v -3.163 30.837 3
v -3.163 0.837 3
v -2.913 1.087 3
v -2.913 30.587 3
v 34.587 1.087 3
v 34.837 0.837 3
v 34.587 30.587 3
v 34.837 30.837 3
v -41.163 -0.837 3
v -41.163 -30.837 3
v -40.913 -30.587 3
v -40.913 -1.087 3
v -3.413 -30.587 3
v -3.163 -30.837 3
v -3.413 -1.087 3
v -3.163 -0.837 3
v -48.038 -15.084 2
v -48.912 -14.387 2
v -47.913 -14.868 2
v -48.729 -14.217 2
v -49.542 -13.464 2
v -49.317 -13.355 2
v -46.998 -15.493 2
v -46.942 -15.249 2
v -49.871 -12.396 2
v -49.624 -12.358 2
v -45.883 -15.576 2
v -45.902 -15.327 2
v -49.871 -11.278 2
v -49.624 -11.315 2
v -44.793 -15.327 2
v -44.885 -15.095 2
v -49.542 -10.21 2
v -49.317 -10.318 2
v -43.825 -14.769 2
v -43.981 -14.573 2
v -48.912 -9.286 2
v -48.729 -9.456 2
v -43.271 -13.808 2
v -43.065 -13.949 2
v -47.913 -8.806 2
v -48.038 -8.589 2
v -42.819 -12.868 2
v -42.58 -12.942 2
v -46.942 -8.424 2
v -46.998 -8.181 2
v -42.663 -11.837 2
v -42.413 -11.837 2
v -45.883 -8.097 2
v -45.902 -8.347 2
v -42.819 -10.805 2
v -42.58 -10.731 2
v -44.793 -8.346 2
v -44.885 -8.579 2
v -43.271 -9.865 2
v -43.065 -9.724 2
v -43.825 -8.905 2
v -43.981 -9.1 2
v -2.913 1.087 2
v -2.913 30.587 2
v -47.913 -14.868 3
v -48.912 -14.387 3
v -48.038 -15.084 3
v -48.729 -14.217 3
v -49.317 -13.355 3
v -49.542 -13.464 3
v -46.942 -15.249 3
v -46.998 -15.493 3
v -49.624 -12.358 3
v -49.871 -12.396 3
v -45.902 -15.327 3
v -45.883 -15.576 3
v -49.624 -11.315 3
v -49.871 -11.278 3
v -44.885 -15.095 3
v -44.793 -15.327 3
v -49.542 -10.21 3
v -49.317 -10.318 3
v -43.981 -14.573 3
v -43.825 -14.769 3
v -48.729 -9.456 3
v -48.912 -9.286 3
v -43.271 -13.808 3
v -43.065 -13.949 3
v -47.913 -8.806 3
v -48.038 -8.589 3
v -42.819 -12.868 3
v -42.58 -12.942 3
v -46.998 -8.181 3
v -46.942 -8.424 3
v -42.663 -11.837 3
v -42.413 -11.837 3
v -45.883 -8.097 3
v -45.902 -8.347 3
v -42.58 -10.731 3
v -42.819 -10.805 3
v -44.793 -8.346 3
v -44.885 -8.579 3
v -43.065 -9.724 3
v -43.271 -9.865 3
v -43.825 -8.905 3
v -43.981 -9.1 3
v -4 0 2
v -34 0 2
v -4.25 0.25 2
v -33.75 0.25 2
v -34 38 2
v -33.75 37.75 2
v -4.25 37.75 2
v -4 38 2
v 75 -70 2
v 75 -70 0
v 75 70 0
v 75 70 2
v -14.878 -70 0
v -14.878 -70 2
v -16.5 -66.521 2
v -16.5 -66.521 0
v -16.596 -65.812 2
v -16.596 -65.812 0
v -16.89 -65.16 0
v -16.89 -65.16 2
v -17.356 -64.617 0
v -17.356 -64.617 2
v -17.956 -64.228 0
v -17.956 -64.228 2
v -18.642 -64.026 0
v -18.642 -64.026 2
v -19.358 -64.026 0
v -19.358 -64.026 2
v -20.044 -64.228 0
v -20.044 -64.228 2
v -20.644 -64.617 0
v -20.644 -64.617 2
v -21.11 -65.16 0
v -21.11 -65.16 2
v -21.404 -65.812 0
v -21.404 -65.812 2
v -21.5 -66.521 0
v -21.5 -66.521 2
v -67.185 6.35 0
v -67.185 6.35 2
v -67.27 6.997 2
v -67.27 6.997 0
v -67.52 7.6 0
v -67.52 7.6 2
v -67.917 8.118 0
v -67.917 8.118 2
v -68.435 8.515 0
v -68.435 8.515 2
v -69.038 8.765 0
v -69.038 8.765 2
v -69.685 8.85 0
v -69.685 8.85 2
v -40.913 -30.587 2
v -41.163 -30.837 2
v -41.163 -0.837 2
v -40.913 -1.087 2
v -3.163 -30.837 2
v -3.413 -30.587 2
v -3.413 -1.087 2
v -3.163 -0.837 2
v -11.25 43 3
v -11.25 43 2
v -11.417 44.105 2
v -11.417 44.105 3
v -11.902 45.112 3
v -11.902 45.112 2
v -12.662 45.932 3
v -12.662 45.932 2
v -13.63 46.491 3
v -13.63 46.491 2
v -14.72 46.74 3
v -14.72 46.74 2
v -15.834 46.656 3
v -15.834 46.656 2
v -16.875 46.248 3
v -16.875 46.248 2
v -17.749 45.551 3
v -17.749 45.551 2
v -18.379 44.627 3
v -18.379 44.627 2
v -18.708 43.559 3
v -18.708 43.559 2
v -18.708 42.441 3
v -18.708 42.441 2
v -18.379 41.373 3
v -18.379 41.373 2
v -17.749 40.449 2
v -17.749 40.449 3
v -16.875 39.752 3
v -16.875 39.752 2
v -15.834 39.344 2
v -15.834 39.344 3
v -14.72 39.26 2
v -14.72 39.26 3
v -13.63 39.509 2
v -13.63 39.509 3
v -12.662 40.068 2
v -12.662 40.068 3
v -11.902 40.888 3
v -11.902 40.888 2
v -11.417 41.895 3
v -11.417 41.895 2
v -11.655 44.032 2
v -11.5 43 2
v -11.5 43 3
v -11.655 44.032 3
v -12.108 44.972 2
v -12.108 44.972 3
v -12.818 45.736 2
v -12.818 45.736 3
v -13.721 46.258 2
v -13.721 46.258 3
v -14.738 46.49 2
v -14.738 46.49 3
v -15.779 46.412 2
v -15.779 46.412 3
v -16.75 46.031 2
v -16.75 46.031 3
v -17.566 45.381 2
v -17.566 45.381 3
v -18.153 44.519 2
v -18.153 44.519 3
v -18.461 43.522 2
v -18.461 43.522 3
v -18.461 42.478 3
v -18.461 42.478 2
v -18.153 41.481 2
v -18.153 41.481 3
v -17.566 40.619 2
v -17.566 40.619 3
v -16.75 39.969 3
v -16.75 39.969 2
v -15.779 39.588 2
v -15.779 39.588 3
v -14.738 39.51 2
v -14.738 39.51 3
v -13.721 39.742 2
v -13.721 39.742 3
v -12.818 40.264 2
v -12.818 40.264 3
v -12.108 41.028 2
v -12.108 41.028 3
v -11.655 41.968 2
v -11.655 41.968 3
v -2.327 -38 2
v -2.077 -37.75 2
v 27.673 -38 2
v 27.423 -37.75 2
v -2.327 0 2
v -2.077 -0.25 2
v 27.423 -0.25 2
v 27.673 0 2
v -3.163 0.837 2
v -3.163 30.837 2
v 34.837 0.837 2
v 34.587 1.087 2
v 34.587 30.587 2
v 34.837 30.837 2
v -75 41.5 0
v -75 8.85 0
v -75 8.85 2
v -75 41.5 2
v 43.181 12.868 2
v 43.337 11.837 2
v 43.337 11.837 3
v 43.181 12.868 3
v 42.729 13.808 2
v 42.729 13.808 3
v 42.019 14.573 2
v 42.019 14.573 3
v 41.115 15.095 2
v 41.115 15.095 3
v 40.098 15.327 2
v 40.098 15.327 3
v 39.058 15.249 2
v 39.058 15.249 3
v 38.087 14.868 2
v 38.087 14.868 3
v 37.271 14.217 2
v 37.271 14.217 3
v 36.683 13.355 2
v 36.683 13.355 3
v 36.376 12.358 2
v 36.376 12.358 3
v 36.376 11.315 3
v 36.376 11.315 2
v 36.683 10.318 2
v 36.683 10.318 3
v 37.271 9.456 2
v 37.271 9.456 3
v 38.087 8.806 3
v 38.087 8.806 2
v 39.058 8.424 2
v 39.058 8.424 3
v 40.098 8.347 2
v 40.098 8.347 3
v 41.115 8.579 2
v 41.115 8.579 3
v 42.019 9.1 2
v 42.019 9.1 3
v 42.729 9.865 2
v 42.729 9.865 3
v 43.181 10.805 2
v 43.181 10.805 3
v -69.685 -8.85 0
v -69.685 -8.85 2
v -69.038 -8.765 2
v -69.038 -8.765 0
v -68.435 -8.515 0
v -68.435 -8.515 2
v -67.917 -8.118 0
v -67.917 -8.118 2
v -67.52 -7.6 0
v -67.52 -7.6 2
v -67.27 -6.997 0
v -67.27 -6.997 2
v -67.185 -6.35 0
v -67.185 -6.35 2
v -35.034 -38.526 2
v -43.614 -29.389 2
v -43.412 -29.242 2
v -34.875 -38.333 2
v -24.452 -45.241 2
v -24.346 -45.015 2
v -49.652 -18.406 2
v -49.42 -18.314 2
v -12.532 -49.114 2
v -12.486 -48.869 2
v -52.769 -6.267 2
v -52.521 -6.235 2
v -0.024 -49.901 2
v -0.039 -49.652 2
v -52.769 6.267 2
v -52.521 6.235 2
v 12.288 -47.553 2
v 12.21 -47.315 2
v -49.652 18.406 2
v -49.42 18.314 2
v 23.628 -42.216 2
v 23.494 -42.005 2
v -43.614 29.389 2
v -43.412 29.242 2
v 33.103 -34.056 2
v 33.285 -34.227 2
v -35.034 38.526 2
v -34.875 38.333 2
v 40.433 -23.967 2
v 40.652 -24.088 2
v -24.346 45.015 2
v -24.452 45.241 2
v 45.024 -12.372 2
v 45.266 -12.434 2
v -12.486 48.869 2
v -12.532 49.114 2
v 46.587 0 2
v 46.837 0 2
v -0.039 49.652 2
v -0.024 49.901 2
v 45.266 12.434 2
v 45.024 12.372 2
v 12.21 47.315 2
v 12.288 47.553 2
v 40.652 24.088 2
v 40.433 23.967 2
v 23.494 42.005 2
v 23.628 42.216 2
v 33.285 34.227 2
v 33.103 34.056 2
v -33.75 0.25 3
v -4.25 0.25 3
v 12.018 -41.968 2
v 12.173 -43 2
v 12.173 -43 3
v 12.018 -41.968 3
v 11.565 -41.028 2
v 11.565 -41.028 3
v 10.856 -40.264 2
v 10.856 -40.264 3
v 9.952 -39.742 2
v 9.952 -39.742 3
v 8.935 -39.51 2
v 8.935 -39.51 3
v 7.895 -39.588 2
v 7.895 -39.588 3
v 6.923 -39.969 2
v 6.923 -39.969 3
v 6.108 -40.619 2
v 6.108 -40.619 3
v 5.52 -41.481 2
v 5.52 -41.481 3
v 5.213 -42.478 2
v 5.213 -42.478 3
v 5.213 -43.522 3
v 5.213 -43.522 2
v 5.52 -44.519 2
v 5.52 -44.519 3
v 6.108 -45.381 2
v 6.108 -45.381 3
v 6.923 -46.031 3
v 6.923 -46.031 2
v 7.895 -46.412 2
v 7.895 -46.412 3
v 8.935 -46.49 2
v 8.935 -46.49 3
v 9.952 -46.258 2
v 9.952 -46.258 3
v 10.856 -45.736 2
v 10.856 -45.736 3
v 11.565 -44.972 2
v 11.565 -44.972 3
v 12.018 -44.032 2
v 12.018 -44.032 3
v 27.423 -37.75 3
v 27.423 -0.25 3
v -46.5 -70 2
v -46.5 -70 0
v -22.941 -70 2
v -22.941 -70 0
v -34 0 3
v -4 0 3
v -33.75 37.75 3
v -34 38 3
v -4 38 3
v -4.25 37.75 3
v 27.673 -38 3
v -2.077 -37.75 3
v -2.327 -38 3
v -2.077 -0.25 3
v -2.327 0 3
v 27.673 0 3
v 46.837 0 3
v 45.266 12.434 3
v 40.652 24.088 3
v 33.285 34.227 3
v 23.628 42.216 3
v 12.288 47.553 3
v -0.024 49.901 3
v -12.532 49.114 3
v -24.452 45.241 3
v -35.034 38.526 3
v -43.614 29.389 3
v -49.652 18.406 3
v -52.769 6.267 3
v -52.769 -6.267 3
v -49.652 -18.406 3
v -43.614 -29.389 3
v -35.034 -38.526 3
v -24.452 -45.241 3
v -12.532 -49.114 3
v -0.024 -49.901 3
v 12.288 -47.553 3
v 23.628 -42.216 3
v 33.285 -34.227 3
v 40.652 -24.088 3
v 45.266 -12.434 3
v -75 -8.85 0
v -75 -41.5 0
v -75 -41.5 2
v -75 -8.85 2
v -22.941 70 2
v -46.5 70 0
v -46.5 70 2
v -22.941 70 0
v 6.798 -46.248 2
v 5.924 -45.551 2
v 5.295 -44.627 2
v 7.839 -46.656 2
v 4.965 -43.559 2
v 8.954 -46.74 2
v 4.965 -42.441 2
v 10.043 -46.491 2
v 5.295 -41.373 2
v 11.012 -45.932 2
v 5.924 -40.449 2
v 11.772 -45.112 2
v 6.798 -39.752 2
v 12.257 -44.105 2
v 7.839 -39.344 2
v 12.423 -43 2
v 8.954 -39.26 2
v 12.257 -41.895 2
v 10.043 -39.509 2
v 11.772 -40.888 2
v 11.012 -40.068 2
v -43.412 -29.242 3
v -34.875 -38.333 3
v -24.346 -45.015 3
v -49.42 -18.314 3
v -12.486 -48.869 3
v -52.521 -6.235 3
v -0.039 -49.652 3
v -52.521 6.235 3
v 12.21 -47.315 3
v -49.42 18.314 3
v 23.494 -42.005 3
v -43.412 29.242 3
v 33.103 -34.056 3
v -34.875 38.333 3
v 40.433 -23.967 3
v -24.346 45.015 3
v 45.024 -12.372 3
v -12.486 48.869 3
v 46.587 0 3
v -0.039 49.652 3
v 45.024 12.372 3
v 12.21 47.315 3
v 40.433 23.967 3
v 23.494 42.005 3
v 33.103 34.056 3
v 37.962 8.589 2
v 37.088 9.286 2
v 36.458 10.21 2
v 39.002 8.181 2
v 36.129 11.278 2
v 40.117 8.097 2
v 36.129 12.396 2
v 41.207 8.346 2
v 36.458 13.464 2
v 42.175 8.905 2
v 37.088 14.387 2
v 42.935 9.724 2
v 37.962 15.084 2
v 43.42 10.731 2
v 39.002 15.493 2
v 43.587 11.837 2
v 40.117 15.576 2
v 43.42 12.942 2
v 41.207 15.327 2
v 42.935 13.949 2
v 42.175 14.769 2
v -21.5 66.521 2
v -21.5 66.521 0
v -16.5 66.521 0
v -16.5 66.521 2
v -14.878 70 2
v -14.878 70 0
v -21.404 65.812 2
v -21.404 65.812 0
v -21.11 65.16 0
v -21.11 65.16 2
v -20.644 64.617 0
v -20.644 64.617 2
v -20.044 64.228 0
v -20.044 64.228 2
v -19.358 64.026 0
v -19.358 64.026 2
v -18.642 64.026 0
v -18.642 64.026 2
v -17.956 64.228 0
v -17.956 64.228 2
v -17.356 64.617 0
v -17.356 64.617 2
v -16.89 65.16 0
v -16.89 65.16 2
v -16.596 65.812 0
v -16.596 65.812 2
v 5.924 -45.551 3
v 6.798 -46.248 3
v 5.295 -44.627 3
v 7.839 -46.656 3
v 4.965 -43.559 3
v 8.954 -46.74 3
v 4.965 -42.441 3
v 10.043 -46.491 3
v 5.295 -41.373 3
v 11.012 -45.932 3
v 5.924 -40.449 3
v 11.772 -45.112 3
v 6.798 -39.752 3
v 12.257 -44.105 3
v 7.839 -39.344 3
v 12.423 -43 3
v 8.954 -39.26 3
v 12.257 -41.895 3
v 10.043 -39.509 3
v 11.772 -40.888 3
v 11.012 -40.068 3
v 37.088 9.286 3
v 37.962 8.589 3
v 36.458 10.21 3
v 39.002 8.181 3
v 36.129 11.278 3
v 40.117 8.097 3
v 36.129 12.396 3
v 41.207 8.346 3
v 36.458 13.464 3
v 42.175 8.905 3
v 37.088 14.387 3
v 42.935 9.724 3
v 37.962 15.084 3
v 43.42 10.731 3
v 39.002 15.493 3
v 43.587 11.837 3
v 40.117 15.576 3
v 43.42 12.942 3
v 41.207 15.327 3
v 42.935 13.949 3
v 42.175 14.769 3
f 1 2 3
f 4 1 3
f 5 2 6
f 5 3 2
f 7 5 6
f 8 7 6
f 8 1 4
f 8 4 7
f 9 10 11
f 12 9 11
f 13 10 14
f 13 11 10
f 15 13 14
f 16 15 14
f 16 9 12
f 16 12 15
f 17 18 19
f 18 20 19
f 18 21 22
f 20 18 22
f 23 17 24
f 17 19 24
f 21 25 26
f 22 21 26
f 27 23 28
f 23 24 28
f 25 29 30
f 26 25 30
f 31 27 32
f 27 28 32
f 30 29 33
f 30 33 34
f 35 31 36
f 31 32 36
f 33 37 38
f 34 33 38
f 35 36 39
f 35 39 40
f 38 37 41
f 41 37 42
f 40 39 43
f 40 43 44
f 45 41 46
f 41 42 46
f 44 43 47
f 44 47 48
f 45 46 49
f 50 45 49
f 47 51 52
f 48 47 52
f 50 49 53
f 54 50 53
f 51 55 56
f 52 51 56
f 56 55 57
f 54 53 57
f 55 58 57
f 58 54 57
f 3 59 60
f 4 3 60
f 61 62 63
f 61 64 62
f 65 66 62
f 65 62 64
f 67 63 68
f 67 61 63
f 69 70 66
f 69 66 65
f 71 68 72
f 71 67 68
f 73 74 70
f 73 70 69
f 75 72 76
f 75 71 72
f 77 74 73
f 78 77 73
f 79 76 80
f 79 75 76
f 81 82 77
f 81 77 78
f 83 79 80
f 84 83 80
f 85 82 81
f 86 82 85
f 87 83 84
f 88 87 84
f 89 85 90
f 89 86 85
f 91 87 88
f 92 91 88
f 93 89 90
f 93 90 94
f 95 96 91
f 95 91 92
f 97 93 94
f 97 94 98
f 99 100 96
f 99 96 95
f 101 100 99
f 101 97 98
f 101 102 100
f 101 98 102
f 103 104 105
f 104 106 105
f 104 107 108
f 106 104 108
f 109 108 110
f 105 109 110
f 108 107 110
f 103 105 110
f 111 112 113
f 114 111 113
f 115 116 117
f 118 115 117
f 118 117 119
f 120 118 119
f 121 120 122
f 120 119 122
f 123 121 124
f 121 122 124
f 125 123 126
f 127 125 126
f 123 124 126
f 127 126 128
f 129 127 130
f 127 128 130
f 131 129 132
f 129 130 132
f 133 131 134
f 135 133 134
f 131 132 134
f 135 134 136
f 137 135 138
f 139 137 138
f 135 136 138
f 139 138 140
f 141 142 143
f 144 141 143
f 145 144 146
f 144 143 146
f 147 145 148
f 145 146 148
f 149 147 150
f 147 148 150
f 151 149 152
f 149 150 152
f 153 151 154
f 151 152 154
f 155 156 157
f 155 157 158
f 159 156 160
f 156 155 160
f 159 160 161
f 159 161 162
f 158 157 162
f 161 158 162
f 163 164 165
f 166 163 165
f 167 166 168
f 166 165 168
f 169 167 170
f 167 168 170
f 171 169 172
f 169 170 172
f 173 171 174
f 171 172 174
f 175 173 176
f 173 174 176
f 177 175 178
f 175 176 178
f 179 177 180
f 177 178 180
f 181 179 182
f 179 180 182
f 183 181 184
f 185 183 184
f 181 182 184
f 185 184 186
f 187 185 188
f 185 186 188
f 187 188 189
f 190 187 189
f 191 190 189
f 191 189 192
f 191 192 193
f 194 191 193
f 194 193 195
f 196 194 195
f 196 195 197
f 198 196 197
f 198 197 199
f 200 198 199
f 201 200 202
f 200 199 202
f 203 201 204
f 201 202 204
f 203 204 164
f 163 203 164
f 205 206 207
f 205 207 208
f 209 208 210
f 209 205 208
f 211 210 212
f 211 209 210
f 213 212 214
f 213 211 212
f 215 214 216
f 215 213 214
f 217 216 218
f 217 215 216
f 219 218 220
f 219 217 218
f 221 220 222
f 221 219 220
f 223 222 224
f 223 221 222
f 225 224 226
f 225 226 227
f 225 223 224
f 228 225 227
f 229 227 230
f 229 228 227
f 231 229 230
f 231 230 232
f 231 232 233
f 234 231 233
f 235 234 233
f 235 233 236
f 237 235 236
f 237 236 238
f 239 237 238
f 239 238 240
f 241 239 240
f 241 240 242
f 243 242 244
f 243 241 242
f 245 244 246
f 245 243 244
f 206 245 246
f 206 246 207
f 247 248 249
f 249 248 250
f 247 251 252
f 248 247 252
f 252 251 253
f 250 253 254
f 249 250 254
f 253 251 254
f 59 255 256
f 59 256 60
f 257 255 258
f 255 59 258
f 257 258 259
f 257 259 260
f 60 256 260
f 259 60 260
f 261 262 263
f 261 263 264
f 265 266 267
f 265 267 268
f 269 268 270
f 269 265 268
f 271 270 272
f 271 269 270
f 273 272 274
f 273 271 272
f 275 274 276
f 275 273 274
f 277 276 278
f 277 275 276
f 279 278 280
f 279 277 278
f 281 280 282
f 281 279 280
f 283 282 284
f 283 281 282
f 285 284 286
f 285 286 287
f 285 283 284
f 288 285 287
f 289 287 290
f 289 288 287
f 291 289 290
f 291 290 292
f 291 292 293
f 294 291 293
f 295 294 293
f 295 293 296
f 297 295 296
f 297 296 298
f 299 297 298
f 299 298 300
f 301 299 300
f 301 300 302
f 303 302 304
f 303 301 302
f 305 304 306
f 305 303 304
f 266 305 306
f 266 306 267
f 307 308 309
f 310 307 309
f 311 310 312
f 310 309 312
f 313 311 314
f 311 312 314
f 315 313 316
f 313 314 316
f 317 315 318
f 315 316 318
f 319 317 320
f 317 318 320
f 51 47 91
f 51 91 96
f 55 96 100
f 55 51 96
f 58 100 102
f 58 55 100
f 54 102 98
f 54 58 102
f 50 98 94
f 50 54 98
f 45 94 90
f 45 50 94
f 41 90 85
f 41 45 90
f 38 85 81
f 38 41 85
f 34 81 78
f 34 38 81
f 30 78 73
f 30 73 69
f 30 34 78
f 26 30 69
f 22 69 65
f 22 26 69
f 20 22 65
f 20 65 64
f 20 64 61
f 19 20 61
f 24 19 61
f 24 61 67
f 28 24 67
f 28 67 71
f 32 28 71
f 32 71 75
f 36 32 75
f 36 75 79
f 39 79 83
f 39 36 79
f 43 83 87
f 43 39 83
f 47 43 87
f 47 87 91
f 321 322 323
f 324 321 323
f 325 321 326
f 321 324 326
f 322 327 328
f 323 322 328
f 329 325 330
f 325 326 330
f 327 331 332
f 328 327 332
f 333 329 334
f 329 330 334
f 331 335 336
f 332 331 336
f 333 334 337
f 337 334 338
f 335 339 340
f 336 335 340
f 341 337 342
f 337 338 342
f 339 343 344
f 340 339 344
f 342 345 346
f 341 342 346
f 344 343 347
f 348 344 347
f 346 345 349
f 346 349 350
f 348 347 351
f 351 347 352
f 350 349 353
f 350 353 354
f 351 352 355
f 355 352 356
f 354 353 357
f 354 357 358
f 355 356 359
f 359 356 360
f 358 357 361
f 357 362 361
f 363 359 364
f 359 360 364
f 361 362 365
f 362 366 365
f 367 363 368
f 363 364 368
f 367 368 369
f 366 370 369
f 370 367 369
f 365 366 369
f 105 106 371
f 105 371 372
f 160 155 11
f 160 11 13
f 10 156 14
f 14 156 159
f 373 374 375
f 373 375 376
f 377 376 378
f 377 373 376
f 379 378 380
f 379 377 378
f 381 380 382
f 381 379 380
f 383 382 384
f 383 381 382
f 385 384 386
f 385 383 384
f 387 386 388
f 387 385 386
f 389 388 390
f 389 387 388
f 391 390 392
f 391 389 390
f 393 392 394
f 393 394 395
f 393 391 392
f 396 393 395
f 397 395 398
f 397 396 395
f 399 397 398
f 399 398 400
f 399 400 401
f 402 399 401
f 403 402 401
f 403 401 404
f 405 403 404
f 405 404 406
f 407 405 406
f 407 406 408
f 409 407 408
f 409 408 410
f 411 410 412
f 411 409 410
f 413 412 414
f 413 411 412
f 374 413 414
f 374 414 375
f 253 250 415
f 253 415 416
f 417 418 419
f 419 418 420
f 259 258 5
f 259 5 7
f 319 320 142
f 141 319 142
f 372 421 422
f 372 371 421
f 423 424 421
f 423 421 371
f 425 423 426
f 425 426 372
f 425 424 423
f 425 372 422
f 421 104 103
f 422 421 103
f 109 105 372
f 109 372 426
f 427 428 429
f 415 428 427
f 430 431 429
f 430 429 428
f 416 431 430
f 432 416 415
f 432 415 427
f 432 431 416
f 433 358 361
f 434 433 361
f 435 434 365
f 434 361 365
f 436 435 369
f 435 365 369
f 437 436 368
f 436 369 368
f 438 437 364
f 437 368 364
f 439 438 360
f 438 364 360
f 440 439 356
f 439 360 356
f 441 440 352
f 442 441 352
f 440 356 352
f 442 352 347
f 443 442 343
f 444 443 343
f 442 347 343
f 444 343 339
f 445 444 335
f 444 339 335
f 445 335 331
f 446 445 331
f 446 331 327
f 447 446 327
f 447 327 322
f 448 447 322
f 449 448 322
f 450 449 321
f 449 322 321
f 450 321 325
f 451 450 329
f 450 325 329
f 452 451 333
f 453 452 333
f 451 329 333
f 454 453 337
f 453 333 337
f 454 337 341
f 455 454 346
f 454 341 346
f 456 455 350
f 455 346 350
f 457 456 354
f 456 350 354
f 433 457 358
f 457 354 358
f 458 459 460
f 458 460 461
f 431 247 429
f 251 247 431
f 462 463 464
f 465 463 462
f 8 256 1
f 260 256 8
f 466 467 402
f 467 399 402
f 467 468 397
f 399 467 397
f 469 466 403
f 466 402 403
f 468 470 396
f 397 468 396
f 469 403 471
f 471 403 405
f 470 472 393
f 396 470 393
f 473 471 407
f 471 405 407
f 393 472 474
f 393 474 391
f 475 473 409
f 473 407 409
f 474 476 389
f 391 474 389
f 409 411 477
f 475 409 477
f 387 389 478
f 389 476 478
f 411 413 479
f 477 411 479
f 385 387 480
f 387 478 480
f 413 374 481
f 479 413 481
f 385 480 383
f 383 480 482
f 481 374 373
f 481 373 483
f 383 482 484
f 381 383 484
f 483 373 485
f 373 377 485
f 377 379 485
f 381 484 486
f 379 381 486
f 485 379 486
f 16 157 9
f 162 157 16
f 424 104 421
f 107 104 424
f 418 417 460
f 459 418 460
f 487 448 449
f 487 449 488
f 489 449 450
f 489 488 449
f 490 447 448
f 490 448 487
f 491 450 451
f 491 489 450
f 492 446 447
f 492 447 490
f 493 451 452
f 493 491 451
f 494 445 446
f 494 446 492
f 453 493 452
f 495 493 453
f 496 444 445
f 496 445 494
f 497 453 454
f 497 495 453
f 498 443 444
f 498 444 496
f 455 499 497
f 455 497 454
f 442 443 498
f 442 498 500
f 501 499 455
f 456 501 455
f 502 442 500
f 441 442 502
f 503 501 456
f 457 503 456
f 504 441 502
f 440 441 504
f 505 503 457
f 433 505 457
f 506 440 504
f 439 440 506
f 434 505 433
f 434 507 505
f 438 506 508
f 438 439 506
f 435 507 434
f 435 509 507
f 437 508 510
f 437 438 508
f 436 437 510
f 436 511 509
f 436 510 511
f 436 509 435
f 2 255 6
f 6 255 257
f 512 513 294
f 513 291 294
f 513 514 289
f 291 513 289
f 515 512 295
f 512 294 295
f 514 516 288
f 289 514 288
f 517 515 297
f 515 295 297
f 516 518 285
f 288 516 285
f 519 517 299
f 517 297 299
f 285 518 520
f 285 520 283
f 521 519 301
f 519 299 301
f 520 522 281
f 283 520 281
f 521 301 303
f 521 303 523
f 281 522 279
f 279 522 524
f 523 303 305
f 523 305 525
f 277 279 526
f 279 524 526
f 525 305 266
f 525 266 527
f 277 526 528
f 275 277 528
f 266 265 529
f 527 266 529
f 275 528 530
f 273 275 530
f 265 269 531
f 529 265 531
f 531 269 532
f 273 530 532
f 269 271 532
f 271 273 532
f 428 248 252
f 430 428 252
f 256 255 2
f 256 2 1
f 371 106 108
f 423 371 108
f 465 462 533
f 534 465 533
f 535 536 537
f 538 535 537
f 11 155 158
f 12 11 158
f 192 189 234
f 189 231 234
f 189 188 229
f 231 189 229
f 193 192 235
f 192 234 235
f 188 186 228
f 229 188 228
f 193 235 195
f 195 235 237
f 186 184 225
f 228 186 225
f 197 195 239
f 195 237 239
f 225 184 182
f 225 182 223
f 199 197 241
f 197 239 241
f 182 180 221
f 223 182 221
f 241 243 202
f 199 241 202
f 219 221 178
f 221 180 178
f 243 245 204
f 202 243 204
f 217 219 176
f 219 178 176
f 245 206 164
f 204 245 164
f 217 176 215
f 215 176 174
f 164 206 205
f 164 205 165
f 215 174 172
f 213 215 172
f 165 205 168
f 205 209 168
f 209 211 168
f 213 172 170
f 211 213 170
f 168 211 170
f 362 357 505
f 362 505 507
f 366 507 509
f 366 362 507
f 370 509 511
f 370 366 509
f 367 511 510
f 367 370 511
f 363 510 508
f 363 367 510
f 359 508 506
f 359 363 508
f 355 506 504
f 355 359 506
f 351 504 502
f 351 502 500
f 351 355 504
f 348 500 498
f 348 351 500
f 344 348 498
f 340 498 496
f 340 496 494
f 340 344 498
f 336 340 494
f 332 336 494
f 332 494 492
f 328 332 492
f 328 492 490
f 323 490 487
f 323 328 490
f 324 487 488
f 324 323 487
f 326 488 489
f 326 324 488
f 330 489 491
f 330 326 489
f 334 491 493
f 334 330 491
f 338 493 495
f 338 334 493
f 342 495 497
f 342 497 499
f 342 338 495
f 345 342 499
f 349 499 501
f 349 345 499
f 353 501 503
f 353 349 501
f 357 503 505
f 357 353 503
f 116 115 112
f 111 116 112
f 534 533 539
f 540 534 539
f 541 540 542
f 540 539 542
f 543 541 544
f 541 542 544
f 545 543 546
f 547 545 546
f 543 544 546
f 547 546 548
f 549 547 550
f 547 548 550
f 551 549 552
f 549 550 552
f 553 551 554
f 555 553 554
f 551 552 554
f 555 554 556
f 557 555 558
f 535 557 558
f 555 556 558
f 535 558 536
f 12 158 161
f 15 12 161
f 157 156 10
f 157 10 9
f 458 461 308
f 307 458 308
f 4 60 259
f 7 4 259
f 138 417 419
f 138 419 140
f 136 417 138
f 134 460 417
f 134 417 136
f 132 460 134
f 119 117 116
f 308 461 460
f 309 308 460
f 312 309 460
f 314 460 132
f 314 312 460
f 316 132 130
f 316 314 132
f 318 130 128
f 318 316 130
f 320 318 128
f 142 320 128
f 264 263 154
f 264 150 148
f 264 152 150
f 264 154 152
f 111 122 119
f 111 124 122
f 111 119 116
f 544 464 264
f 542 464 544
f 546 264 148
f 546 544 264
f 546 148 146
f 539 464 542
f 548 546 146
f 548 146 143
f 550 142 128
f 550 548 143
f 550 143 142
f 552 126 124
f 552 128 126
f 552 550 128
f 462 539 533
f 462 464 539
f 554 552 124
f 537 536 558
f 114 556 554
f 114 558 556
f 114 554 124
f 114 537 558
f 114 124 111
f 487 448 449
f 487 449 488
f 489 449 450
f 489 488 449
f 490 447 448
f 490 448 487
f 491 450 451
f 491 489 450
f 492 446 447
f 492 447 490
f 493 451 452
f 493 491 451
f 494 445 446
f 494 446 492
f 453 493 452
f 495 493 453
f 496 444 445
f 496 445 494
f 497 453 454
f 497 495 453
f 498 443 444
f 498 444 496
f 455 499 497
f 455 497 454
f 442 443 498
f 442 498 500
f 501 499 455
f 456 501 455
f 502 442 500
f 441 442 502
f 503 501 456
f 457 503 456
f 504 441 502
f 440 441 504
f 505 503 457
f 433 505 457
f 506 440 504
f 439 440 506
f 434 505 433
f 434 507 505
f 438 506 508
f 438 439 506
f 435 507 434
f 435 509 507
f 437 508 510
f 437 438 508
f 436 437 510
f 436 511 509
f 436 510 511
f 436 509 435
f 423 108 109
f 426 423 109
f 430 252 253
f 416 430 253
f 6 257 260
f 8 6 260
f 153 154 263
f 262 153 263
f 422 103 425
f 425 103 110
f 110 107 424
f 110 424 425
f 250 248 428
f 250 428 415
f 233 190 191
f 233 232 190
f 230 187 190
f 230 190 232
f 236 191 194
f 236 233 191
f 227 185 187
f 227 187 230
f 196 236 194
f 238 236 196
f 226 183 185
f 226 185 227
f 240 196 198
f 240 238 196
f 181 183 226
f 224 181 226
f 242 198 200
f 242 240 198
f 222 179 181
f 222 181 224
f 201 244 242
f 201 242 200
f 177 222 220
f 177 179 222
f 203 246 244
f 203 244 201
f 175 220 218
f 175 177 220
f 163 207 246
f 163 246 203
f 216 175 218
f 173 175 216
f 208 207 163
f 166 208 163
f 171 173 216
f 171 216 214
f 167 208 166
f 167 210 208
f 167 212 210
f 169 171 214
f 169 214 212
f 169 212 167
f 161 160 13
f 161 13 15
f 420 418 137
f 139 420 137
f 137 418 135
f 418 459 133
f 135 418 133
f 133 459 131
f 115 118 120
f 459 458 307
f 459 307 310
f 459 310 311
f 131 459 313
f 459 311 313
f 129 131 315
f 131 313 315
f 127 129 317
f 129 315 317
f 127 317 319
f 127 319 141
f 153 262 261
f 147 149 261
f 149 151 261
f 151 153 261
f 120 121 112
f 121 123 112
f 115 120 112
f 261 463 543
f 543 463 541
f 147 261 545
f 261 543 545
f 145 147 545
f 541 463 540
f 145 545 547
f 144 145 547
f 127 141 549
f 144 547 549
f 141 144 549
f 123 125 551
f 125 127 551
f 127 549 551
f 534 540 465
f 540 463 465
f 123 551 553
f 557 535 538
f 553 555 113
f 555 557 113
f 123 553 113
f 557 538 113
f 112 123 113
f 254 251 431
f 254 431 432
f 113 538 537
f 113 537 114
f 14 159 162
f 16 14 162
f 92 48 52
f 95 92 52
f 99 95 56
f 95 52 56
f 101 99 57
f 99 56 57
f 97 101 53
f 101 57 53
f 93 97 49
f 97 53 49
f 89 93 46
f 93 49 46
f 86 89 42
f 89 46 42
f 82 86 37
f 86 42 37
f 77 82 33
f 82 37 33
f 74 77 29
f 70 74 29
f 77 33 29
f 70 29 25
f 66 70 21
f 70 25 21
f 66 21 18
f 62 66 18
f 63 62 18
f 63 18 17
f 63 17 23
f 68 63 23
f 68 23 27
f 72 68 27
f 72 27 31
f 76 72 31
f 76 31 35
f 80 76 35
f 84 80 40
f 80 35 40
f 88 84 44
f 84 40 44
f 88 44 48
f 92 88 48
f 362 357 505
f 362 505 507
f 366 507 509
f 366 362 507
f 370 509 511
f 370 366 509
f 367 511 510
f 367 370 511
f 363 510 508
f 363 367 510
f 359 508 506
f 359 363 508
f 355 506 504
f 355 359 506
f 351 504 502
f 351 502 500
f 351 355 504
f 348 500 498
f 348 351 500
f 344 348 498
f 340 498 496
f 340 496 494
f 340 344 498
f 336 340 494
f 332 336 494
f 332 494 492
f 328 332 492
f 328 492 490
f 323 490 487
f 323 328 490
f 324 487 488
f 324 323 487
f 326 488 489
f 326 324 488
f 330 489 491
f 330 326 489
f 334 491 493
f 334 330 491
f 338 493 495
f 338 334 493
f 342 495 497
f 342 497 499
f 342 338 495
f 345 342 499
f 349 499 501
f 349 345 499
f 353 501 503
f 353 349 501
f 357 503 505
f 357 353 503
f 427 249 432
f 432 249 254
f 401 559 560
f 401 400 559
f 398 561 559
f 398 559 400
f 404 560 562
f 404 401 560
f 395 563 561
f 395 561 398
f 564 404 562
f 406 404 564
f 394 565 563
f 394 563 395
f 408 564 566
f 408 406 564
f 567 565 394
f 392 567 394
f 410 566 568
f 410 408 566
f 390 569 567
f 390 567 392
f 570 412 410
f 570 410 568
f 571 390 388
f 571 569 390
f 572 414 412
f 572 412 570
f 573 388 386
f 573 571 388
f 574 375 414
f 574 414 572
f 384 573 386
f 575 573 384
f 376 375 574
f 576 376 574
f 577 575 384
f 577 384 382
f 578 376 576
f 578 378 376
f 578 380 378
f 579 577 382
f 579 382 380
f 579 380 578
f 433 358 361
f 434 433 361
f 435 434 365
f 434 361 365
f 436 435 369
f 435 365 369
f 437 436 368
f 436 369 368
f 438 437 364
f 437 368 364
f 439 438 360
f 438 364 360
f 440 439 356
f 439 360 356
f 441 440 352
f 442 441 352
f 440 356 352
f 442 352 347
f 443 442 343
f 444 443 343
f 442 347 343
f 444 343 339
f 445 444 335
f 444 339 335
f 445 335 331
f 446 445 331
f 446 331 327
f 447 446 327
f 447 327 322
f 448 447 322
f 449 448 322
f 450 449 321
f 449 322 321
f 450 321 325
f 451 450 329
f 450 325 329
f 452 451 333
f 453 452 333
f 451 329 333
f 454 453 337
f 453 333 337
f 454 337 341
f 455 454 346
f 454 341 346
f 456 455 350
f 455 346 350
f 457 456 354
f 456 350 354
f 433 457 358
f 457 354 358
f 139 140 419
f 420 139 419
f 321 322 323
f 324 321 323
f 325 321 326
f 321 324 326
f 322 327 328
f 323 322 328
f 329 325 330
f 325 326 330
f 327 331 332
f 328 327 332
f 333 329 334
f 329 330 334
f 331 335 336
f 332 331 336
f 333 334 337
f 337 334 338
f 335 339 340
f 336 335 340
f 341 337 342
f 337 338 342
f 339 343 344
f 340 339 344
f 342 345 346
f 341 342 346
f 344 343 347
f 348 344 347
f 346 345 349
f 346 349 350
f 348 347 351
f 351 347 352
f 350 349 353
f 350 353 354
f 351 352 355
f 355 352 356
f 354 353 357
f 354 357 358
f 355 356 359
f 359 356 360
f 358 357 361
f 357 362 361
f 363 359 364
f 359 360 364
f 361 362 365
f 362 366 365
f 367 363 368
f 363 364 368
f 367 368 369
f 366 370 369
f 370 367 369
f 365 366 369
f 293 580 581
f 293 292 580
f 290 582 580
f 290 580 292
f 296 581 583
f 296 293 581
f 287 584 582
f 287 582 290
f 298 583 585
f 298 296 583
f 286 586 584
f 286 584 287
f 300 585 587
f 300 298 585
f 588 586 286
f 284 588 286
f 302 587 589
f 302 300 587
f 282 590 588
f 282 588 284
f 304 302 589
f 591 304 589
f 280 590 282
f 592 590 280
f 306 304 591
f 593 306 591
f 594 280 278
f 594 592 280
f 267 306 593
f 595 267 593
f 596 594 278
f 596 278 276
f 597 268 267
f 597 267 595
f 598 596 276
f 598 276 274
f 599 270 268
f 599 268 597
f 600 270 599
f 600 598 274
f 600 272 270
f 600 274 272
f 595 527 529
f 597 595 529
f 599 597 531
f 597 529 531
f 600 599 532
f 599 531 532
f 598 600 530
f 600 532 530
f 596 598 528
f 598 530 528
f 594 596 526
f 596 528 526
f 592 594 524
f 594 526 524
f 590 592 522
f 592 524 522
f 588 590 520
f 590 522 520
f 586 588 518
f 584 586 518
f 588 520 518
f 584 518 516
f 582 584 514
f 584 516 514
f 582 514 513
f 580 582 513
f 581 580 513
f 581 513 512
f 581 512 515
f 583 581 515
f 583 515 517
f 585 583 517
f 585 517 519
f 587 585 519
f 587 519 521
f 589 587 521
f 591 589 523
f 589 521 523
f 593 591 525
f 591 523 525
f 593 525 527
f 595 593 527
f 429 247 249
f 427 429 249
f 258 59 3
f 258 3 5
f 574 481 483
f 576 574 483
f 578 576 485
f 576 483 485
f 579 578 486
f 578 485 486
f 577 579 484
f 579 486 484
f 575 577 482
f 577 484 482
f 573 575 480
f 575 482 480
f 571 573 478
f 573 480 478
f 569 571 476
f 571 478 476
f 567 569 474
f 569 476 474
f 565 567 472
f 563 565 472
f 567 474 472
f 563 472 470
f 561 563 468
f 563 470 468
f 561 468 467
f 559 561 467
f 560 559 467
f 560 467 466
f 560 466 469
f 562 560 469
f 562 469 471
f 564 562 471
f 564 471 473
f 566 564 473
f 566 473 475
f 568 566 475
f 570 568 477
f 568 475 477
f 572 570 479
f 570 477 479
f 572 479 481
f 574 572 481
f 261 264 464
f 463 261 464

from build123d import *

# Parameters (mm, degrees)
F0_W     = 150
F0_H     = 140
F1_DEPTH = 2
F2_R     = 2.5
F3_DEPTH = 5
F4_R     = 50
F4_R_2   = 49.75
F5_DEPTH = 1
F6_DEPTH = 1
F4_W     = 38
F4_H     = 30
F4_W_2   = 37.5
F4_H_2   = 29.5
F4_R_3   = 3.75
F4_R_4   = 3.5
F4_W_3   = 30
F4_H_3   = 38
F4_W_4   = 29.5
F4_H_4   = 37.5


# Not quite as in the source:
# - a feature names something its author has since deleted; it is built from what else it names


with BuildPart() as f1:
    # F0 (on Top) → F1 (new body)
    with BuildSketch(Plane.XY):
        Rectangle(F0_W, F0_H)
    extrude(amount=F1_DEPTH)

    # F2 (on face) → F3 (cut)
    with BuildSketch(Plane.XY.offset(2)):
        Polygon((-75, 70), (-75, 41.5), (-46.5, 70), align=None)
        with Locations((-64, 57.6)):
            Circle(F2_R, mode=Mode.SUBTRACT)
        Polygon((-46.5, -70), (-75, -41.5), (-75, -70), align=None)
        with Locations((-64, -57.6)):
            Circle(F2_R, mode=Mode.SUBTRACT)
        with BuildLine():
            Line((-67.1845650673, -6.35), (-67.1845650673, 6.35))
            ThreePointArc((-67.1845650673, 6.35), (-67.9167981143, 8.117766953), (-69.6845650673, 8.85))
            Line((-69.6845650673, 8.85), (-75, 8.85))
            Line((-75, 8.85), (-75, -8.85))
            Line((-75, -8.85), (-69.6845650673, -8.85))
            ThreePointArc((-69.6845650673, -8.85), (-67.9167981143, -8.117766953), (-67.1845650673, -6.35))
        make_face()
        with BuildLine():
            Line((-21.499911428, -66.5210440509), (-22.940942165, -70))
            Line((-22.940942165, -70), (-14.8778247705, -70))
            Line((-14.8778247705, -70), (-16.500088572, -66.5210440509))
            ThreePointArc((-16.500088572, -66.5210440509), (-19, -64), (-21.499911428, -66.5210440509))
        make_face()
        with BuildLine():
            Line((-14.8778247705, 70), (-22.940942165, 70))
            Line((-22.940942165, 70), (-21.499911428, 66.5210440509))
            ThreePointArc((-21.499911428, 66.5210440509), (-19, 64), (-16.500088572, 66.5210440509))
            Line((-16.500088572, 66.5210440509), (-14.8778247705, 70))
        make_face()
        with Locations((-64, 57.6)):
            Circle(F2_R)
        with Locations((-64, -57.6)):
            Circle(F2_R)
    extrude(amount=-F3_DEPTH, mode=Mode.SUBTRACT)


with BuildPart() as f5:
    # F4 (on face) → F5 (new body)
    with BuildSketch(Plane.XY.offset(2)):
        with Locations((-3.1632825379, 0)):
            Circle(F4_R)
        with Locations((-3.1632825379, 0)):
            Circle(F4_R_2, mode=Mode.SUBTRACT)
    extrude(amount=F5_DEPTH)


with BuildPart() as f6:
    # F4 (on face) → F6 (new body)
    with BuildSketch(Plane.XY.offset(2)):
        with Locations((-3.1632825379, 0)):
            Circle(F4_R)
        with Locations((-3.1632825379, 0)):
            Circle(F4_R_2, mode=Mode.SUBTRACT)
    extrude(amount=F6_DEPTH)


with BuildPart() as f6b:
    # F4 (on face) → F6, piece 2 (new body)
    with BuildSketch(Plane.XY.offset(2)):
        with Locations((-22.1632825379, -15.8367174621)):
            Rectangle(F4_W, F4_H)
        with Locations((-22.1632825379, -15.8367174621)):
            Rectangle(F4_W_2, F4_H_2, mode=Mode.SUBTRACT)
    extrude(amount=F6_DEPTH)


with BuildPart() as f6c:
    # F4 (on face) → F6, piece 3 (new body)
    with BuildSketch(Plane.XY.offset(2)):
        with Locations((-46.1632825379, -11.8367174621)):
            Circle(F4_R_3)
        with Locations((-46.1632825379, -11.8367174621)):
            Circle(F4_R_4, mode=Mode.SUBTRACT)
    extrude(amount=F6_DEPTH)


with BuildPart() as f6d:
    # F4 (on face) → F6, piece 4 (new body)
    with BuildSketch(Plane.XY.offset(2)):
        with Locations((-19, 19)):
            Rectangle(F4_W_3, F4_H_3)
        with Locations((-19, 19)):
            Rectangle(F4_W_4, F4_H_4, mode=Mode.SUBTRACT)
    extrude(amount=F6_DEPTH)


with BuildPart() as f6e:
    # F4 (on face) → F6, piece 5 (new body)
    with BuildSketch(Plane.XY.offset(2)):
        with Locations((15.8367174621, 15.8367174621)):
            Rectangle(F4_W, F4_H)
        with Locations((15.8367174621, 15.8367174621)):
            Rectangle(F4_W_2, F4_H_2, mode=Mode.SUBTRACT)
    extrude(amount=F6_DEPTH)


with BuildPart() as f6f:
    # F4 (on face) → F6, piece 6 (new body)
    with BuildSketch(Plane.XY.offset(2)):
        with Locations((12.6734349243, -19)):
            Rectangle(F4_W_3, F4_H_3)
        with Locations((12.6734349243, -19)):
            Rectangle(F4_W_4, F4_H_4, mode=Mode.SUBTRACT)
    extrude(amount=F6_DEPTH)


with BuildPart() as f6g:
    # F4 (on face) → F6, piece 7 (new body)
    with BuildSketch(Plane.XY.offset(2)):
        with Locations((39.8367174621, 11.8367174621)):
            Circle(F4_R_3)
        with Locations((39.8367174621, 11.8367174621)):
            Circle(F4_R_4, mode=Mode.SUBTRACT)
    extrude(amount=F6_DEPTH)


with BuildPart() as f6h:
    # F4 (on face) → F6, piece 8 (new body)
    with BuildSketch(Plane.XY.offset(2)):
        with Locations((8.6734349243, -43)):
            Circle(F4_R_3)
        with Locations((8.6734349243, -43)):
            Circle(F4_R_4, mode=Mode.SUBTRACT)
    extrude(amount=F6_DEPTH)


with BuildPart() as f6i:
    # F4 (on face) → F6, piece 9 (new body)
    with BuildSketch(Plane.XY.offset(2)):
        with Locations((-15, 43)):
            Circle(F4_R_3)
        with Locations((-15, 43)):
            Circle(F4_R_4, mode=Mode.SUBTRACT)
    extrude(amount=F6_DEPTH)


solid = Compound([f1.part, f5.part, f6.part, f6b.part, f6c.part, f6d.part, f6e.part, f6f.part, f6g.part, f6h.part, f6i.part])
